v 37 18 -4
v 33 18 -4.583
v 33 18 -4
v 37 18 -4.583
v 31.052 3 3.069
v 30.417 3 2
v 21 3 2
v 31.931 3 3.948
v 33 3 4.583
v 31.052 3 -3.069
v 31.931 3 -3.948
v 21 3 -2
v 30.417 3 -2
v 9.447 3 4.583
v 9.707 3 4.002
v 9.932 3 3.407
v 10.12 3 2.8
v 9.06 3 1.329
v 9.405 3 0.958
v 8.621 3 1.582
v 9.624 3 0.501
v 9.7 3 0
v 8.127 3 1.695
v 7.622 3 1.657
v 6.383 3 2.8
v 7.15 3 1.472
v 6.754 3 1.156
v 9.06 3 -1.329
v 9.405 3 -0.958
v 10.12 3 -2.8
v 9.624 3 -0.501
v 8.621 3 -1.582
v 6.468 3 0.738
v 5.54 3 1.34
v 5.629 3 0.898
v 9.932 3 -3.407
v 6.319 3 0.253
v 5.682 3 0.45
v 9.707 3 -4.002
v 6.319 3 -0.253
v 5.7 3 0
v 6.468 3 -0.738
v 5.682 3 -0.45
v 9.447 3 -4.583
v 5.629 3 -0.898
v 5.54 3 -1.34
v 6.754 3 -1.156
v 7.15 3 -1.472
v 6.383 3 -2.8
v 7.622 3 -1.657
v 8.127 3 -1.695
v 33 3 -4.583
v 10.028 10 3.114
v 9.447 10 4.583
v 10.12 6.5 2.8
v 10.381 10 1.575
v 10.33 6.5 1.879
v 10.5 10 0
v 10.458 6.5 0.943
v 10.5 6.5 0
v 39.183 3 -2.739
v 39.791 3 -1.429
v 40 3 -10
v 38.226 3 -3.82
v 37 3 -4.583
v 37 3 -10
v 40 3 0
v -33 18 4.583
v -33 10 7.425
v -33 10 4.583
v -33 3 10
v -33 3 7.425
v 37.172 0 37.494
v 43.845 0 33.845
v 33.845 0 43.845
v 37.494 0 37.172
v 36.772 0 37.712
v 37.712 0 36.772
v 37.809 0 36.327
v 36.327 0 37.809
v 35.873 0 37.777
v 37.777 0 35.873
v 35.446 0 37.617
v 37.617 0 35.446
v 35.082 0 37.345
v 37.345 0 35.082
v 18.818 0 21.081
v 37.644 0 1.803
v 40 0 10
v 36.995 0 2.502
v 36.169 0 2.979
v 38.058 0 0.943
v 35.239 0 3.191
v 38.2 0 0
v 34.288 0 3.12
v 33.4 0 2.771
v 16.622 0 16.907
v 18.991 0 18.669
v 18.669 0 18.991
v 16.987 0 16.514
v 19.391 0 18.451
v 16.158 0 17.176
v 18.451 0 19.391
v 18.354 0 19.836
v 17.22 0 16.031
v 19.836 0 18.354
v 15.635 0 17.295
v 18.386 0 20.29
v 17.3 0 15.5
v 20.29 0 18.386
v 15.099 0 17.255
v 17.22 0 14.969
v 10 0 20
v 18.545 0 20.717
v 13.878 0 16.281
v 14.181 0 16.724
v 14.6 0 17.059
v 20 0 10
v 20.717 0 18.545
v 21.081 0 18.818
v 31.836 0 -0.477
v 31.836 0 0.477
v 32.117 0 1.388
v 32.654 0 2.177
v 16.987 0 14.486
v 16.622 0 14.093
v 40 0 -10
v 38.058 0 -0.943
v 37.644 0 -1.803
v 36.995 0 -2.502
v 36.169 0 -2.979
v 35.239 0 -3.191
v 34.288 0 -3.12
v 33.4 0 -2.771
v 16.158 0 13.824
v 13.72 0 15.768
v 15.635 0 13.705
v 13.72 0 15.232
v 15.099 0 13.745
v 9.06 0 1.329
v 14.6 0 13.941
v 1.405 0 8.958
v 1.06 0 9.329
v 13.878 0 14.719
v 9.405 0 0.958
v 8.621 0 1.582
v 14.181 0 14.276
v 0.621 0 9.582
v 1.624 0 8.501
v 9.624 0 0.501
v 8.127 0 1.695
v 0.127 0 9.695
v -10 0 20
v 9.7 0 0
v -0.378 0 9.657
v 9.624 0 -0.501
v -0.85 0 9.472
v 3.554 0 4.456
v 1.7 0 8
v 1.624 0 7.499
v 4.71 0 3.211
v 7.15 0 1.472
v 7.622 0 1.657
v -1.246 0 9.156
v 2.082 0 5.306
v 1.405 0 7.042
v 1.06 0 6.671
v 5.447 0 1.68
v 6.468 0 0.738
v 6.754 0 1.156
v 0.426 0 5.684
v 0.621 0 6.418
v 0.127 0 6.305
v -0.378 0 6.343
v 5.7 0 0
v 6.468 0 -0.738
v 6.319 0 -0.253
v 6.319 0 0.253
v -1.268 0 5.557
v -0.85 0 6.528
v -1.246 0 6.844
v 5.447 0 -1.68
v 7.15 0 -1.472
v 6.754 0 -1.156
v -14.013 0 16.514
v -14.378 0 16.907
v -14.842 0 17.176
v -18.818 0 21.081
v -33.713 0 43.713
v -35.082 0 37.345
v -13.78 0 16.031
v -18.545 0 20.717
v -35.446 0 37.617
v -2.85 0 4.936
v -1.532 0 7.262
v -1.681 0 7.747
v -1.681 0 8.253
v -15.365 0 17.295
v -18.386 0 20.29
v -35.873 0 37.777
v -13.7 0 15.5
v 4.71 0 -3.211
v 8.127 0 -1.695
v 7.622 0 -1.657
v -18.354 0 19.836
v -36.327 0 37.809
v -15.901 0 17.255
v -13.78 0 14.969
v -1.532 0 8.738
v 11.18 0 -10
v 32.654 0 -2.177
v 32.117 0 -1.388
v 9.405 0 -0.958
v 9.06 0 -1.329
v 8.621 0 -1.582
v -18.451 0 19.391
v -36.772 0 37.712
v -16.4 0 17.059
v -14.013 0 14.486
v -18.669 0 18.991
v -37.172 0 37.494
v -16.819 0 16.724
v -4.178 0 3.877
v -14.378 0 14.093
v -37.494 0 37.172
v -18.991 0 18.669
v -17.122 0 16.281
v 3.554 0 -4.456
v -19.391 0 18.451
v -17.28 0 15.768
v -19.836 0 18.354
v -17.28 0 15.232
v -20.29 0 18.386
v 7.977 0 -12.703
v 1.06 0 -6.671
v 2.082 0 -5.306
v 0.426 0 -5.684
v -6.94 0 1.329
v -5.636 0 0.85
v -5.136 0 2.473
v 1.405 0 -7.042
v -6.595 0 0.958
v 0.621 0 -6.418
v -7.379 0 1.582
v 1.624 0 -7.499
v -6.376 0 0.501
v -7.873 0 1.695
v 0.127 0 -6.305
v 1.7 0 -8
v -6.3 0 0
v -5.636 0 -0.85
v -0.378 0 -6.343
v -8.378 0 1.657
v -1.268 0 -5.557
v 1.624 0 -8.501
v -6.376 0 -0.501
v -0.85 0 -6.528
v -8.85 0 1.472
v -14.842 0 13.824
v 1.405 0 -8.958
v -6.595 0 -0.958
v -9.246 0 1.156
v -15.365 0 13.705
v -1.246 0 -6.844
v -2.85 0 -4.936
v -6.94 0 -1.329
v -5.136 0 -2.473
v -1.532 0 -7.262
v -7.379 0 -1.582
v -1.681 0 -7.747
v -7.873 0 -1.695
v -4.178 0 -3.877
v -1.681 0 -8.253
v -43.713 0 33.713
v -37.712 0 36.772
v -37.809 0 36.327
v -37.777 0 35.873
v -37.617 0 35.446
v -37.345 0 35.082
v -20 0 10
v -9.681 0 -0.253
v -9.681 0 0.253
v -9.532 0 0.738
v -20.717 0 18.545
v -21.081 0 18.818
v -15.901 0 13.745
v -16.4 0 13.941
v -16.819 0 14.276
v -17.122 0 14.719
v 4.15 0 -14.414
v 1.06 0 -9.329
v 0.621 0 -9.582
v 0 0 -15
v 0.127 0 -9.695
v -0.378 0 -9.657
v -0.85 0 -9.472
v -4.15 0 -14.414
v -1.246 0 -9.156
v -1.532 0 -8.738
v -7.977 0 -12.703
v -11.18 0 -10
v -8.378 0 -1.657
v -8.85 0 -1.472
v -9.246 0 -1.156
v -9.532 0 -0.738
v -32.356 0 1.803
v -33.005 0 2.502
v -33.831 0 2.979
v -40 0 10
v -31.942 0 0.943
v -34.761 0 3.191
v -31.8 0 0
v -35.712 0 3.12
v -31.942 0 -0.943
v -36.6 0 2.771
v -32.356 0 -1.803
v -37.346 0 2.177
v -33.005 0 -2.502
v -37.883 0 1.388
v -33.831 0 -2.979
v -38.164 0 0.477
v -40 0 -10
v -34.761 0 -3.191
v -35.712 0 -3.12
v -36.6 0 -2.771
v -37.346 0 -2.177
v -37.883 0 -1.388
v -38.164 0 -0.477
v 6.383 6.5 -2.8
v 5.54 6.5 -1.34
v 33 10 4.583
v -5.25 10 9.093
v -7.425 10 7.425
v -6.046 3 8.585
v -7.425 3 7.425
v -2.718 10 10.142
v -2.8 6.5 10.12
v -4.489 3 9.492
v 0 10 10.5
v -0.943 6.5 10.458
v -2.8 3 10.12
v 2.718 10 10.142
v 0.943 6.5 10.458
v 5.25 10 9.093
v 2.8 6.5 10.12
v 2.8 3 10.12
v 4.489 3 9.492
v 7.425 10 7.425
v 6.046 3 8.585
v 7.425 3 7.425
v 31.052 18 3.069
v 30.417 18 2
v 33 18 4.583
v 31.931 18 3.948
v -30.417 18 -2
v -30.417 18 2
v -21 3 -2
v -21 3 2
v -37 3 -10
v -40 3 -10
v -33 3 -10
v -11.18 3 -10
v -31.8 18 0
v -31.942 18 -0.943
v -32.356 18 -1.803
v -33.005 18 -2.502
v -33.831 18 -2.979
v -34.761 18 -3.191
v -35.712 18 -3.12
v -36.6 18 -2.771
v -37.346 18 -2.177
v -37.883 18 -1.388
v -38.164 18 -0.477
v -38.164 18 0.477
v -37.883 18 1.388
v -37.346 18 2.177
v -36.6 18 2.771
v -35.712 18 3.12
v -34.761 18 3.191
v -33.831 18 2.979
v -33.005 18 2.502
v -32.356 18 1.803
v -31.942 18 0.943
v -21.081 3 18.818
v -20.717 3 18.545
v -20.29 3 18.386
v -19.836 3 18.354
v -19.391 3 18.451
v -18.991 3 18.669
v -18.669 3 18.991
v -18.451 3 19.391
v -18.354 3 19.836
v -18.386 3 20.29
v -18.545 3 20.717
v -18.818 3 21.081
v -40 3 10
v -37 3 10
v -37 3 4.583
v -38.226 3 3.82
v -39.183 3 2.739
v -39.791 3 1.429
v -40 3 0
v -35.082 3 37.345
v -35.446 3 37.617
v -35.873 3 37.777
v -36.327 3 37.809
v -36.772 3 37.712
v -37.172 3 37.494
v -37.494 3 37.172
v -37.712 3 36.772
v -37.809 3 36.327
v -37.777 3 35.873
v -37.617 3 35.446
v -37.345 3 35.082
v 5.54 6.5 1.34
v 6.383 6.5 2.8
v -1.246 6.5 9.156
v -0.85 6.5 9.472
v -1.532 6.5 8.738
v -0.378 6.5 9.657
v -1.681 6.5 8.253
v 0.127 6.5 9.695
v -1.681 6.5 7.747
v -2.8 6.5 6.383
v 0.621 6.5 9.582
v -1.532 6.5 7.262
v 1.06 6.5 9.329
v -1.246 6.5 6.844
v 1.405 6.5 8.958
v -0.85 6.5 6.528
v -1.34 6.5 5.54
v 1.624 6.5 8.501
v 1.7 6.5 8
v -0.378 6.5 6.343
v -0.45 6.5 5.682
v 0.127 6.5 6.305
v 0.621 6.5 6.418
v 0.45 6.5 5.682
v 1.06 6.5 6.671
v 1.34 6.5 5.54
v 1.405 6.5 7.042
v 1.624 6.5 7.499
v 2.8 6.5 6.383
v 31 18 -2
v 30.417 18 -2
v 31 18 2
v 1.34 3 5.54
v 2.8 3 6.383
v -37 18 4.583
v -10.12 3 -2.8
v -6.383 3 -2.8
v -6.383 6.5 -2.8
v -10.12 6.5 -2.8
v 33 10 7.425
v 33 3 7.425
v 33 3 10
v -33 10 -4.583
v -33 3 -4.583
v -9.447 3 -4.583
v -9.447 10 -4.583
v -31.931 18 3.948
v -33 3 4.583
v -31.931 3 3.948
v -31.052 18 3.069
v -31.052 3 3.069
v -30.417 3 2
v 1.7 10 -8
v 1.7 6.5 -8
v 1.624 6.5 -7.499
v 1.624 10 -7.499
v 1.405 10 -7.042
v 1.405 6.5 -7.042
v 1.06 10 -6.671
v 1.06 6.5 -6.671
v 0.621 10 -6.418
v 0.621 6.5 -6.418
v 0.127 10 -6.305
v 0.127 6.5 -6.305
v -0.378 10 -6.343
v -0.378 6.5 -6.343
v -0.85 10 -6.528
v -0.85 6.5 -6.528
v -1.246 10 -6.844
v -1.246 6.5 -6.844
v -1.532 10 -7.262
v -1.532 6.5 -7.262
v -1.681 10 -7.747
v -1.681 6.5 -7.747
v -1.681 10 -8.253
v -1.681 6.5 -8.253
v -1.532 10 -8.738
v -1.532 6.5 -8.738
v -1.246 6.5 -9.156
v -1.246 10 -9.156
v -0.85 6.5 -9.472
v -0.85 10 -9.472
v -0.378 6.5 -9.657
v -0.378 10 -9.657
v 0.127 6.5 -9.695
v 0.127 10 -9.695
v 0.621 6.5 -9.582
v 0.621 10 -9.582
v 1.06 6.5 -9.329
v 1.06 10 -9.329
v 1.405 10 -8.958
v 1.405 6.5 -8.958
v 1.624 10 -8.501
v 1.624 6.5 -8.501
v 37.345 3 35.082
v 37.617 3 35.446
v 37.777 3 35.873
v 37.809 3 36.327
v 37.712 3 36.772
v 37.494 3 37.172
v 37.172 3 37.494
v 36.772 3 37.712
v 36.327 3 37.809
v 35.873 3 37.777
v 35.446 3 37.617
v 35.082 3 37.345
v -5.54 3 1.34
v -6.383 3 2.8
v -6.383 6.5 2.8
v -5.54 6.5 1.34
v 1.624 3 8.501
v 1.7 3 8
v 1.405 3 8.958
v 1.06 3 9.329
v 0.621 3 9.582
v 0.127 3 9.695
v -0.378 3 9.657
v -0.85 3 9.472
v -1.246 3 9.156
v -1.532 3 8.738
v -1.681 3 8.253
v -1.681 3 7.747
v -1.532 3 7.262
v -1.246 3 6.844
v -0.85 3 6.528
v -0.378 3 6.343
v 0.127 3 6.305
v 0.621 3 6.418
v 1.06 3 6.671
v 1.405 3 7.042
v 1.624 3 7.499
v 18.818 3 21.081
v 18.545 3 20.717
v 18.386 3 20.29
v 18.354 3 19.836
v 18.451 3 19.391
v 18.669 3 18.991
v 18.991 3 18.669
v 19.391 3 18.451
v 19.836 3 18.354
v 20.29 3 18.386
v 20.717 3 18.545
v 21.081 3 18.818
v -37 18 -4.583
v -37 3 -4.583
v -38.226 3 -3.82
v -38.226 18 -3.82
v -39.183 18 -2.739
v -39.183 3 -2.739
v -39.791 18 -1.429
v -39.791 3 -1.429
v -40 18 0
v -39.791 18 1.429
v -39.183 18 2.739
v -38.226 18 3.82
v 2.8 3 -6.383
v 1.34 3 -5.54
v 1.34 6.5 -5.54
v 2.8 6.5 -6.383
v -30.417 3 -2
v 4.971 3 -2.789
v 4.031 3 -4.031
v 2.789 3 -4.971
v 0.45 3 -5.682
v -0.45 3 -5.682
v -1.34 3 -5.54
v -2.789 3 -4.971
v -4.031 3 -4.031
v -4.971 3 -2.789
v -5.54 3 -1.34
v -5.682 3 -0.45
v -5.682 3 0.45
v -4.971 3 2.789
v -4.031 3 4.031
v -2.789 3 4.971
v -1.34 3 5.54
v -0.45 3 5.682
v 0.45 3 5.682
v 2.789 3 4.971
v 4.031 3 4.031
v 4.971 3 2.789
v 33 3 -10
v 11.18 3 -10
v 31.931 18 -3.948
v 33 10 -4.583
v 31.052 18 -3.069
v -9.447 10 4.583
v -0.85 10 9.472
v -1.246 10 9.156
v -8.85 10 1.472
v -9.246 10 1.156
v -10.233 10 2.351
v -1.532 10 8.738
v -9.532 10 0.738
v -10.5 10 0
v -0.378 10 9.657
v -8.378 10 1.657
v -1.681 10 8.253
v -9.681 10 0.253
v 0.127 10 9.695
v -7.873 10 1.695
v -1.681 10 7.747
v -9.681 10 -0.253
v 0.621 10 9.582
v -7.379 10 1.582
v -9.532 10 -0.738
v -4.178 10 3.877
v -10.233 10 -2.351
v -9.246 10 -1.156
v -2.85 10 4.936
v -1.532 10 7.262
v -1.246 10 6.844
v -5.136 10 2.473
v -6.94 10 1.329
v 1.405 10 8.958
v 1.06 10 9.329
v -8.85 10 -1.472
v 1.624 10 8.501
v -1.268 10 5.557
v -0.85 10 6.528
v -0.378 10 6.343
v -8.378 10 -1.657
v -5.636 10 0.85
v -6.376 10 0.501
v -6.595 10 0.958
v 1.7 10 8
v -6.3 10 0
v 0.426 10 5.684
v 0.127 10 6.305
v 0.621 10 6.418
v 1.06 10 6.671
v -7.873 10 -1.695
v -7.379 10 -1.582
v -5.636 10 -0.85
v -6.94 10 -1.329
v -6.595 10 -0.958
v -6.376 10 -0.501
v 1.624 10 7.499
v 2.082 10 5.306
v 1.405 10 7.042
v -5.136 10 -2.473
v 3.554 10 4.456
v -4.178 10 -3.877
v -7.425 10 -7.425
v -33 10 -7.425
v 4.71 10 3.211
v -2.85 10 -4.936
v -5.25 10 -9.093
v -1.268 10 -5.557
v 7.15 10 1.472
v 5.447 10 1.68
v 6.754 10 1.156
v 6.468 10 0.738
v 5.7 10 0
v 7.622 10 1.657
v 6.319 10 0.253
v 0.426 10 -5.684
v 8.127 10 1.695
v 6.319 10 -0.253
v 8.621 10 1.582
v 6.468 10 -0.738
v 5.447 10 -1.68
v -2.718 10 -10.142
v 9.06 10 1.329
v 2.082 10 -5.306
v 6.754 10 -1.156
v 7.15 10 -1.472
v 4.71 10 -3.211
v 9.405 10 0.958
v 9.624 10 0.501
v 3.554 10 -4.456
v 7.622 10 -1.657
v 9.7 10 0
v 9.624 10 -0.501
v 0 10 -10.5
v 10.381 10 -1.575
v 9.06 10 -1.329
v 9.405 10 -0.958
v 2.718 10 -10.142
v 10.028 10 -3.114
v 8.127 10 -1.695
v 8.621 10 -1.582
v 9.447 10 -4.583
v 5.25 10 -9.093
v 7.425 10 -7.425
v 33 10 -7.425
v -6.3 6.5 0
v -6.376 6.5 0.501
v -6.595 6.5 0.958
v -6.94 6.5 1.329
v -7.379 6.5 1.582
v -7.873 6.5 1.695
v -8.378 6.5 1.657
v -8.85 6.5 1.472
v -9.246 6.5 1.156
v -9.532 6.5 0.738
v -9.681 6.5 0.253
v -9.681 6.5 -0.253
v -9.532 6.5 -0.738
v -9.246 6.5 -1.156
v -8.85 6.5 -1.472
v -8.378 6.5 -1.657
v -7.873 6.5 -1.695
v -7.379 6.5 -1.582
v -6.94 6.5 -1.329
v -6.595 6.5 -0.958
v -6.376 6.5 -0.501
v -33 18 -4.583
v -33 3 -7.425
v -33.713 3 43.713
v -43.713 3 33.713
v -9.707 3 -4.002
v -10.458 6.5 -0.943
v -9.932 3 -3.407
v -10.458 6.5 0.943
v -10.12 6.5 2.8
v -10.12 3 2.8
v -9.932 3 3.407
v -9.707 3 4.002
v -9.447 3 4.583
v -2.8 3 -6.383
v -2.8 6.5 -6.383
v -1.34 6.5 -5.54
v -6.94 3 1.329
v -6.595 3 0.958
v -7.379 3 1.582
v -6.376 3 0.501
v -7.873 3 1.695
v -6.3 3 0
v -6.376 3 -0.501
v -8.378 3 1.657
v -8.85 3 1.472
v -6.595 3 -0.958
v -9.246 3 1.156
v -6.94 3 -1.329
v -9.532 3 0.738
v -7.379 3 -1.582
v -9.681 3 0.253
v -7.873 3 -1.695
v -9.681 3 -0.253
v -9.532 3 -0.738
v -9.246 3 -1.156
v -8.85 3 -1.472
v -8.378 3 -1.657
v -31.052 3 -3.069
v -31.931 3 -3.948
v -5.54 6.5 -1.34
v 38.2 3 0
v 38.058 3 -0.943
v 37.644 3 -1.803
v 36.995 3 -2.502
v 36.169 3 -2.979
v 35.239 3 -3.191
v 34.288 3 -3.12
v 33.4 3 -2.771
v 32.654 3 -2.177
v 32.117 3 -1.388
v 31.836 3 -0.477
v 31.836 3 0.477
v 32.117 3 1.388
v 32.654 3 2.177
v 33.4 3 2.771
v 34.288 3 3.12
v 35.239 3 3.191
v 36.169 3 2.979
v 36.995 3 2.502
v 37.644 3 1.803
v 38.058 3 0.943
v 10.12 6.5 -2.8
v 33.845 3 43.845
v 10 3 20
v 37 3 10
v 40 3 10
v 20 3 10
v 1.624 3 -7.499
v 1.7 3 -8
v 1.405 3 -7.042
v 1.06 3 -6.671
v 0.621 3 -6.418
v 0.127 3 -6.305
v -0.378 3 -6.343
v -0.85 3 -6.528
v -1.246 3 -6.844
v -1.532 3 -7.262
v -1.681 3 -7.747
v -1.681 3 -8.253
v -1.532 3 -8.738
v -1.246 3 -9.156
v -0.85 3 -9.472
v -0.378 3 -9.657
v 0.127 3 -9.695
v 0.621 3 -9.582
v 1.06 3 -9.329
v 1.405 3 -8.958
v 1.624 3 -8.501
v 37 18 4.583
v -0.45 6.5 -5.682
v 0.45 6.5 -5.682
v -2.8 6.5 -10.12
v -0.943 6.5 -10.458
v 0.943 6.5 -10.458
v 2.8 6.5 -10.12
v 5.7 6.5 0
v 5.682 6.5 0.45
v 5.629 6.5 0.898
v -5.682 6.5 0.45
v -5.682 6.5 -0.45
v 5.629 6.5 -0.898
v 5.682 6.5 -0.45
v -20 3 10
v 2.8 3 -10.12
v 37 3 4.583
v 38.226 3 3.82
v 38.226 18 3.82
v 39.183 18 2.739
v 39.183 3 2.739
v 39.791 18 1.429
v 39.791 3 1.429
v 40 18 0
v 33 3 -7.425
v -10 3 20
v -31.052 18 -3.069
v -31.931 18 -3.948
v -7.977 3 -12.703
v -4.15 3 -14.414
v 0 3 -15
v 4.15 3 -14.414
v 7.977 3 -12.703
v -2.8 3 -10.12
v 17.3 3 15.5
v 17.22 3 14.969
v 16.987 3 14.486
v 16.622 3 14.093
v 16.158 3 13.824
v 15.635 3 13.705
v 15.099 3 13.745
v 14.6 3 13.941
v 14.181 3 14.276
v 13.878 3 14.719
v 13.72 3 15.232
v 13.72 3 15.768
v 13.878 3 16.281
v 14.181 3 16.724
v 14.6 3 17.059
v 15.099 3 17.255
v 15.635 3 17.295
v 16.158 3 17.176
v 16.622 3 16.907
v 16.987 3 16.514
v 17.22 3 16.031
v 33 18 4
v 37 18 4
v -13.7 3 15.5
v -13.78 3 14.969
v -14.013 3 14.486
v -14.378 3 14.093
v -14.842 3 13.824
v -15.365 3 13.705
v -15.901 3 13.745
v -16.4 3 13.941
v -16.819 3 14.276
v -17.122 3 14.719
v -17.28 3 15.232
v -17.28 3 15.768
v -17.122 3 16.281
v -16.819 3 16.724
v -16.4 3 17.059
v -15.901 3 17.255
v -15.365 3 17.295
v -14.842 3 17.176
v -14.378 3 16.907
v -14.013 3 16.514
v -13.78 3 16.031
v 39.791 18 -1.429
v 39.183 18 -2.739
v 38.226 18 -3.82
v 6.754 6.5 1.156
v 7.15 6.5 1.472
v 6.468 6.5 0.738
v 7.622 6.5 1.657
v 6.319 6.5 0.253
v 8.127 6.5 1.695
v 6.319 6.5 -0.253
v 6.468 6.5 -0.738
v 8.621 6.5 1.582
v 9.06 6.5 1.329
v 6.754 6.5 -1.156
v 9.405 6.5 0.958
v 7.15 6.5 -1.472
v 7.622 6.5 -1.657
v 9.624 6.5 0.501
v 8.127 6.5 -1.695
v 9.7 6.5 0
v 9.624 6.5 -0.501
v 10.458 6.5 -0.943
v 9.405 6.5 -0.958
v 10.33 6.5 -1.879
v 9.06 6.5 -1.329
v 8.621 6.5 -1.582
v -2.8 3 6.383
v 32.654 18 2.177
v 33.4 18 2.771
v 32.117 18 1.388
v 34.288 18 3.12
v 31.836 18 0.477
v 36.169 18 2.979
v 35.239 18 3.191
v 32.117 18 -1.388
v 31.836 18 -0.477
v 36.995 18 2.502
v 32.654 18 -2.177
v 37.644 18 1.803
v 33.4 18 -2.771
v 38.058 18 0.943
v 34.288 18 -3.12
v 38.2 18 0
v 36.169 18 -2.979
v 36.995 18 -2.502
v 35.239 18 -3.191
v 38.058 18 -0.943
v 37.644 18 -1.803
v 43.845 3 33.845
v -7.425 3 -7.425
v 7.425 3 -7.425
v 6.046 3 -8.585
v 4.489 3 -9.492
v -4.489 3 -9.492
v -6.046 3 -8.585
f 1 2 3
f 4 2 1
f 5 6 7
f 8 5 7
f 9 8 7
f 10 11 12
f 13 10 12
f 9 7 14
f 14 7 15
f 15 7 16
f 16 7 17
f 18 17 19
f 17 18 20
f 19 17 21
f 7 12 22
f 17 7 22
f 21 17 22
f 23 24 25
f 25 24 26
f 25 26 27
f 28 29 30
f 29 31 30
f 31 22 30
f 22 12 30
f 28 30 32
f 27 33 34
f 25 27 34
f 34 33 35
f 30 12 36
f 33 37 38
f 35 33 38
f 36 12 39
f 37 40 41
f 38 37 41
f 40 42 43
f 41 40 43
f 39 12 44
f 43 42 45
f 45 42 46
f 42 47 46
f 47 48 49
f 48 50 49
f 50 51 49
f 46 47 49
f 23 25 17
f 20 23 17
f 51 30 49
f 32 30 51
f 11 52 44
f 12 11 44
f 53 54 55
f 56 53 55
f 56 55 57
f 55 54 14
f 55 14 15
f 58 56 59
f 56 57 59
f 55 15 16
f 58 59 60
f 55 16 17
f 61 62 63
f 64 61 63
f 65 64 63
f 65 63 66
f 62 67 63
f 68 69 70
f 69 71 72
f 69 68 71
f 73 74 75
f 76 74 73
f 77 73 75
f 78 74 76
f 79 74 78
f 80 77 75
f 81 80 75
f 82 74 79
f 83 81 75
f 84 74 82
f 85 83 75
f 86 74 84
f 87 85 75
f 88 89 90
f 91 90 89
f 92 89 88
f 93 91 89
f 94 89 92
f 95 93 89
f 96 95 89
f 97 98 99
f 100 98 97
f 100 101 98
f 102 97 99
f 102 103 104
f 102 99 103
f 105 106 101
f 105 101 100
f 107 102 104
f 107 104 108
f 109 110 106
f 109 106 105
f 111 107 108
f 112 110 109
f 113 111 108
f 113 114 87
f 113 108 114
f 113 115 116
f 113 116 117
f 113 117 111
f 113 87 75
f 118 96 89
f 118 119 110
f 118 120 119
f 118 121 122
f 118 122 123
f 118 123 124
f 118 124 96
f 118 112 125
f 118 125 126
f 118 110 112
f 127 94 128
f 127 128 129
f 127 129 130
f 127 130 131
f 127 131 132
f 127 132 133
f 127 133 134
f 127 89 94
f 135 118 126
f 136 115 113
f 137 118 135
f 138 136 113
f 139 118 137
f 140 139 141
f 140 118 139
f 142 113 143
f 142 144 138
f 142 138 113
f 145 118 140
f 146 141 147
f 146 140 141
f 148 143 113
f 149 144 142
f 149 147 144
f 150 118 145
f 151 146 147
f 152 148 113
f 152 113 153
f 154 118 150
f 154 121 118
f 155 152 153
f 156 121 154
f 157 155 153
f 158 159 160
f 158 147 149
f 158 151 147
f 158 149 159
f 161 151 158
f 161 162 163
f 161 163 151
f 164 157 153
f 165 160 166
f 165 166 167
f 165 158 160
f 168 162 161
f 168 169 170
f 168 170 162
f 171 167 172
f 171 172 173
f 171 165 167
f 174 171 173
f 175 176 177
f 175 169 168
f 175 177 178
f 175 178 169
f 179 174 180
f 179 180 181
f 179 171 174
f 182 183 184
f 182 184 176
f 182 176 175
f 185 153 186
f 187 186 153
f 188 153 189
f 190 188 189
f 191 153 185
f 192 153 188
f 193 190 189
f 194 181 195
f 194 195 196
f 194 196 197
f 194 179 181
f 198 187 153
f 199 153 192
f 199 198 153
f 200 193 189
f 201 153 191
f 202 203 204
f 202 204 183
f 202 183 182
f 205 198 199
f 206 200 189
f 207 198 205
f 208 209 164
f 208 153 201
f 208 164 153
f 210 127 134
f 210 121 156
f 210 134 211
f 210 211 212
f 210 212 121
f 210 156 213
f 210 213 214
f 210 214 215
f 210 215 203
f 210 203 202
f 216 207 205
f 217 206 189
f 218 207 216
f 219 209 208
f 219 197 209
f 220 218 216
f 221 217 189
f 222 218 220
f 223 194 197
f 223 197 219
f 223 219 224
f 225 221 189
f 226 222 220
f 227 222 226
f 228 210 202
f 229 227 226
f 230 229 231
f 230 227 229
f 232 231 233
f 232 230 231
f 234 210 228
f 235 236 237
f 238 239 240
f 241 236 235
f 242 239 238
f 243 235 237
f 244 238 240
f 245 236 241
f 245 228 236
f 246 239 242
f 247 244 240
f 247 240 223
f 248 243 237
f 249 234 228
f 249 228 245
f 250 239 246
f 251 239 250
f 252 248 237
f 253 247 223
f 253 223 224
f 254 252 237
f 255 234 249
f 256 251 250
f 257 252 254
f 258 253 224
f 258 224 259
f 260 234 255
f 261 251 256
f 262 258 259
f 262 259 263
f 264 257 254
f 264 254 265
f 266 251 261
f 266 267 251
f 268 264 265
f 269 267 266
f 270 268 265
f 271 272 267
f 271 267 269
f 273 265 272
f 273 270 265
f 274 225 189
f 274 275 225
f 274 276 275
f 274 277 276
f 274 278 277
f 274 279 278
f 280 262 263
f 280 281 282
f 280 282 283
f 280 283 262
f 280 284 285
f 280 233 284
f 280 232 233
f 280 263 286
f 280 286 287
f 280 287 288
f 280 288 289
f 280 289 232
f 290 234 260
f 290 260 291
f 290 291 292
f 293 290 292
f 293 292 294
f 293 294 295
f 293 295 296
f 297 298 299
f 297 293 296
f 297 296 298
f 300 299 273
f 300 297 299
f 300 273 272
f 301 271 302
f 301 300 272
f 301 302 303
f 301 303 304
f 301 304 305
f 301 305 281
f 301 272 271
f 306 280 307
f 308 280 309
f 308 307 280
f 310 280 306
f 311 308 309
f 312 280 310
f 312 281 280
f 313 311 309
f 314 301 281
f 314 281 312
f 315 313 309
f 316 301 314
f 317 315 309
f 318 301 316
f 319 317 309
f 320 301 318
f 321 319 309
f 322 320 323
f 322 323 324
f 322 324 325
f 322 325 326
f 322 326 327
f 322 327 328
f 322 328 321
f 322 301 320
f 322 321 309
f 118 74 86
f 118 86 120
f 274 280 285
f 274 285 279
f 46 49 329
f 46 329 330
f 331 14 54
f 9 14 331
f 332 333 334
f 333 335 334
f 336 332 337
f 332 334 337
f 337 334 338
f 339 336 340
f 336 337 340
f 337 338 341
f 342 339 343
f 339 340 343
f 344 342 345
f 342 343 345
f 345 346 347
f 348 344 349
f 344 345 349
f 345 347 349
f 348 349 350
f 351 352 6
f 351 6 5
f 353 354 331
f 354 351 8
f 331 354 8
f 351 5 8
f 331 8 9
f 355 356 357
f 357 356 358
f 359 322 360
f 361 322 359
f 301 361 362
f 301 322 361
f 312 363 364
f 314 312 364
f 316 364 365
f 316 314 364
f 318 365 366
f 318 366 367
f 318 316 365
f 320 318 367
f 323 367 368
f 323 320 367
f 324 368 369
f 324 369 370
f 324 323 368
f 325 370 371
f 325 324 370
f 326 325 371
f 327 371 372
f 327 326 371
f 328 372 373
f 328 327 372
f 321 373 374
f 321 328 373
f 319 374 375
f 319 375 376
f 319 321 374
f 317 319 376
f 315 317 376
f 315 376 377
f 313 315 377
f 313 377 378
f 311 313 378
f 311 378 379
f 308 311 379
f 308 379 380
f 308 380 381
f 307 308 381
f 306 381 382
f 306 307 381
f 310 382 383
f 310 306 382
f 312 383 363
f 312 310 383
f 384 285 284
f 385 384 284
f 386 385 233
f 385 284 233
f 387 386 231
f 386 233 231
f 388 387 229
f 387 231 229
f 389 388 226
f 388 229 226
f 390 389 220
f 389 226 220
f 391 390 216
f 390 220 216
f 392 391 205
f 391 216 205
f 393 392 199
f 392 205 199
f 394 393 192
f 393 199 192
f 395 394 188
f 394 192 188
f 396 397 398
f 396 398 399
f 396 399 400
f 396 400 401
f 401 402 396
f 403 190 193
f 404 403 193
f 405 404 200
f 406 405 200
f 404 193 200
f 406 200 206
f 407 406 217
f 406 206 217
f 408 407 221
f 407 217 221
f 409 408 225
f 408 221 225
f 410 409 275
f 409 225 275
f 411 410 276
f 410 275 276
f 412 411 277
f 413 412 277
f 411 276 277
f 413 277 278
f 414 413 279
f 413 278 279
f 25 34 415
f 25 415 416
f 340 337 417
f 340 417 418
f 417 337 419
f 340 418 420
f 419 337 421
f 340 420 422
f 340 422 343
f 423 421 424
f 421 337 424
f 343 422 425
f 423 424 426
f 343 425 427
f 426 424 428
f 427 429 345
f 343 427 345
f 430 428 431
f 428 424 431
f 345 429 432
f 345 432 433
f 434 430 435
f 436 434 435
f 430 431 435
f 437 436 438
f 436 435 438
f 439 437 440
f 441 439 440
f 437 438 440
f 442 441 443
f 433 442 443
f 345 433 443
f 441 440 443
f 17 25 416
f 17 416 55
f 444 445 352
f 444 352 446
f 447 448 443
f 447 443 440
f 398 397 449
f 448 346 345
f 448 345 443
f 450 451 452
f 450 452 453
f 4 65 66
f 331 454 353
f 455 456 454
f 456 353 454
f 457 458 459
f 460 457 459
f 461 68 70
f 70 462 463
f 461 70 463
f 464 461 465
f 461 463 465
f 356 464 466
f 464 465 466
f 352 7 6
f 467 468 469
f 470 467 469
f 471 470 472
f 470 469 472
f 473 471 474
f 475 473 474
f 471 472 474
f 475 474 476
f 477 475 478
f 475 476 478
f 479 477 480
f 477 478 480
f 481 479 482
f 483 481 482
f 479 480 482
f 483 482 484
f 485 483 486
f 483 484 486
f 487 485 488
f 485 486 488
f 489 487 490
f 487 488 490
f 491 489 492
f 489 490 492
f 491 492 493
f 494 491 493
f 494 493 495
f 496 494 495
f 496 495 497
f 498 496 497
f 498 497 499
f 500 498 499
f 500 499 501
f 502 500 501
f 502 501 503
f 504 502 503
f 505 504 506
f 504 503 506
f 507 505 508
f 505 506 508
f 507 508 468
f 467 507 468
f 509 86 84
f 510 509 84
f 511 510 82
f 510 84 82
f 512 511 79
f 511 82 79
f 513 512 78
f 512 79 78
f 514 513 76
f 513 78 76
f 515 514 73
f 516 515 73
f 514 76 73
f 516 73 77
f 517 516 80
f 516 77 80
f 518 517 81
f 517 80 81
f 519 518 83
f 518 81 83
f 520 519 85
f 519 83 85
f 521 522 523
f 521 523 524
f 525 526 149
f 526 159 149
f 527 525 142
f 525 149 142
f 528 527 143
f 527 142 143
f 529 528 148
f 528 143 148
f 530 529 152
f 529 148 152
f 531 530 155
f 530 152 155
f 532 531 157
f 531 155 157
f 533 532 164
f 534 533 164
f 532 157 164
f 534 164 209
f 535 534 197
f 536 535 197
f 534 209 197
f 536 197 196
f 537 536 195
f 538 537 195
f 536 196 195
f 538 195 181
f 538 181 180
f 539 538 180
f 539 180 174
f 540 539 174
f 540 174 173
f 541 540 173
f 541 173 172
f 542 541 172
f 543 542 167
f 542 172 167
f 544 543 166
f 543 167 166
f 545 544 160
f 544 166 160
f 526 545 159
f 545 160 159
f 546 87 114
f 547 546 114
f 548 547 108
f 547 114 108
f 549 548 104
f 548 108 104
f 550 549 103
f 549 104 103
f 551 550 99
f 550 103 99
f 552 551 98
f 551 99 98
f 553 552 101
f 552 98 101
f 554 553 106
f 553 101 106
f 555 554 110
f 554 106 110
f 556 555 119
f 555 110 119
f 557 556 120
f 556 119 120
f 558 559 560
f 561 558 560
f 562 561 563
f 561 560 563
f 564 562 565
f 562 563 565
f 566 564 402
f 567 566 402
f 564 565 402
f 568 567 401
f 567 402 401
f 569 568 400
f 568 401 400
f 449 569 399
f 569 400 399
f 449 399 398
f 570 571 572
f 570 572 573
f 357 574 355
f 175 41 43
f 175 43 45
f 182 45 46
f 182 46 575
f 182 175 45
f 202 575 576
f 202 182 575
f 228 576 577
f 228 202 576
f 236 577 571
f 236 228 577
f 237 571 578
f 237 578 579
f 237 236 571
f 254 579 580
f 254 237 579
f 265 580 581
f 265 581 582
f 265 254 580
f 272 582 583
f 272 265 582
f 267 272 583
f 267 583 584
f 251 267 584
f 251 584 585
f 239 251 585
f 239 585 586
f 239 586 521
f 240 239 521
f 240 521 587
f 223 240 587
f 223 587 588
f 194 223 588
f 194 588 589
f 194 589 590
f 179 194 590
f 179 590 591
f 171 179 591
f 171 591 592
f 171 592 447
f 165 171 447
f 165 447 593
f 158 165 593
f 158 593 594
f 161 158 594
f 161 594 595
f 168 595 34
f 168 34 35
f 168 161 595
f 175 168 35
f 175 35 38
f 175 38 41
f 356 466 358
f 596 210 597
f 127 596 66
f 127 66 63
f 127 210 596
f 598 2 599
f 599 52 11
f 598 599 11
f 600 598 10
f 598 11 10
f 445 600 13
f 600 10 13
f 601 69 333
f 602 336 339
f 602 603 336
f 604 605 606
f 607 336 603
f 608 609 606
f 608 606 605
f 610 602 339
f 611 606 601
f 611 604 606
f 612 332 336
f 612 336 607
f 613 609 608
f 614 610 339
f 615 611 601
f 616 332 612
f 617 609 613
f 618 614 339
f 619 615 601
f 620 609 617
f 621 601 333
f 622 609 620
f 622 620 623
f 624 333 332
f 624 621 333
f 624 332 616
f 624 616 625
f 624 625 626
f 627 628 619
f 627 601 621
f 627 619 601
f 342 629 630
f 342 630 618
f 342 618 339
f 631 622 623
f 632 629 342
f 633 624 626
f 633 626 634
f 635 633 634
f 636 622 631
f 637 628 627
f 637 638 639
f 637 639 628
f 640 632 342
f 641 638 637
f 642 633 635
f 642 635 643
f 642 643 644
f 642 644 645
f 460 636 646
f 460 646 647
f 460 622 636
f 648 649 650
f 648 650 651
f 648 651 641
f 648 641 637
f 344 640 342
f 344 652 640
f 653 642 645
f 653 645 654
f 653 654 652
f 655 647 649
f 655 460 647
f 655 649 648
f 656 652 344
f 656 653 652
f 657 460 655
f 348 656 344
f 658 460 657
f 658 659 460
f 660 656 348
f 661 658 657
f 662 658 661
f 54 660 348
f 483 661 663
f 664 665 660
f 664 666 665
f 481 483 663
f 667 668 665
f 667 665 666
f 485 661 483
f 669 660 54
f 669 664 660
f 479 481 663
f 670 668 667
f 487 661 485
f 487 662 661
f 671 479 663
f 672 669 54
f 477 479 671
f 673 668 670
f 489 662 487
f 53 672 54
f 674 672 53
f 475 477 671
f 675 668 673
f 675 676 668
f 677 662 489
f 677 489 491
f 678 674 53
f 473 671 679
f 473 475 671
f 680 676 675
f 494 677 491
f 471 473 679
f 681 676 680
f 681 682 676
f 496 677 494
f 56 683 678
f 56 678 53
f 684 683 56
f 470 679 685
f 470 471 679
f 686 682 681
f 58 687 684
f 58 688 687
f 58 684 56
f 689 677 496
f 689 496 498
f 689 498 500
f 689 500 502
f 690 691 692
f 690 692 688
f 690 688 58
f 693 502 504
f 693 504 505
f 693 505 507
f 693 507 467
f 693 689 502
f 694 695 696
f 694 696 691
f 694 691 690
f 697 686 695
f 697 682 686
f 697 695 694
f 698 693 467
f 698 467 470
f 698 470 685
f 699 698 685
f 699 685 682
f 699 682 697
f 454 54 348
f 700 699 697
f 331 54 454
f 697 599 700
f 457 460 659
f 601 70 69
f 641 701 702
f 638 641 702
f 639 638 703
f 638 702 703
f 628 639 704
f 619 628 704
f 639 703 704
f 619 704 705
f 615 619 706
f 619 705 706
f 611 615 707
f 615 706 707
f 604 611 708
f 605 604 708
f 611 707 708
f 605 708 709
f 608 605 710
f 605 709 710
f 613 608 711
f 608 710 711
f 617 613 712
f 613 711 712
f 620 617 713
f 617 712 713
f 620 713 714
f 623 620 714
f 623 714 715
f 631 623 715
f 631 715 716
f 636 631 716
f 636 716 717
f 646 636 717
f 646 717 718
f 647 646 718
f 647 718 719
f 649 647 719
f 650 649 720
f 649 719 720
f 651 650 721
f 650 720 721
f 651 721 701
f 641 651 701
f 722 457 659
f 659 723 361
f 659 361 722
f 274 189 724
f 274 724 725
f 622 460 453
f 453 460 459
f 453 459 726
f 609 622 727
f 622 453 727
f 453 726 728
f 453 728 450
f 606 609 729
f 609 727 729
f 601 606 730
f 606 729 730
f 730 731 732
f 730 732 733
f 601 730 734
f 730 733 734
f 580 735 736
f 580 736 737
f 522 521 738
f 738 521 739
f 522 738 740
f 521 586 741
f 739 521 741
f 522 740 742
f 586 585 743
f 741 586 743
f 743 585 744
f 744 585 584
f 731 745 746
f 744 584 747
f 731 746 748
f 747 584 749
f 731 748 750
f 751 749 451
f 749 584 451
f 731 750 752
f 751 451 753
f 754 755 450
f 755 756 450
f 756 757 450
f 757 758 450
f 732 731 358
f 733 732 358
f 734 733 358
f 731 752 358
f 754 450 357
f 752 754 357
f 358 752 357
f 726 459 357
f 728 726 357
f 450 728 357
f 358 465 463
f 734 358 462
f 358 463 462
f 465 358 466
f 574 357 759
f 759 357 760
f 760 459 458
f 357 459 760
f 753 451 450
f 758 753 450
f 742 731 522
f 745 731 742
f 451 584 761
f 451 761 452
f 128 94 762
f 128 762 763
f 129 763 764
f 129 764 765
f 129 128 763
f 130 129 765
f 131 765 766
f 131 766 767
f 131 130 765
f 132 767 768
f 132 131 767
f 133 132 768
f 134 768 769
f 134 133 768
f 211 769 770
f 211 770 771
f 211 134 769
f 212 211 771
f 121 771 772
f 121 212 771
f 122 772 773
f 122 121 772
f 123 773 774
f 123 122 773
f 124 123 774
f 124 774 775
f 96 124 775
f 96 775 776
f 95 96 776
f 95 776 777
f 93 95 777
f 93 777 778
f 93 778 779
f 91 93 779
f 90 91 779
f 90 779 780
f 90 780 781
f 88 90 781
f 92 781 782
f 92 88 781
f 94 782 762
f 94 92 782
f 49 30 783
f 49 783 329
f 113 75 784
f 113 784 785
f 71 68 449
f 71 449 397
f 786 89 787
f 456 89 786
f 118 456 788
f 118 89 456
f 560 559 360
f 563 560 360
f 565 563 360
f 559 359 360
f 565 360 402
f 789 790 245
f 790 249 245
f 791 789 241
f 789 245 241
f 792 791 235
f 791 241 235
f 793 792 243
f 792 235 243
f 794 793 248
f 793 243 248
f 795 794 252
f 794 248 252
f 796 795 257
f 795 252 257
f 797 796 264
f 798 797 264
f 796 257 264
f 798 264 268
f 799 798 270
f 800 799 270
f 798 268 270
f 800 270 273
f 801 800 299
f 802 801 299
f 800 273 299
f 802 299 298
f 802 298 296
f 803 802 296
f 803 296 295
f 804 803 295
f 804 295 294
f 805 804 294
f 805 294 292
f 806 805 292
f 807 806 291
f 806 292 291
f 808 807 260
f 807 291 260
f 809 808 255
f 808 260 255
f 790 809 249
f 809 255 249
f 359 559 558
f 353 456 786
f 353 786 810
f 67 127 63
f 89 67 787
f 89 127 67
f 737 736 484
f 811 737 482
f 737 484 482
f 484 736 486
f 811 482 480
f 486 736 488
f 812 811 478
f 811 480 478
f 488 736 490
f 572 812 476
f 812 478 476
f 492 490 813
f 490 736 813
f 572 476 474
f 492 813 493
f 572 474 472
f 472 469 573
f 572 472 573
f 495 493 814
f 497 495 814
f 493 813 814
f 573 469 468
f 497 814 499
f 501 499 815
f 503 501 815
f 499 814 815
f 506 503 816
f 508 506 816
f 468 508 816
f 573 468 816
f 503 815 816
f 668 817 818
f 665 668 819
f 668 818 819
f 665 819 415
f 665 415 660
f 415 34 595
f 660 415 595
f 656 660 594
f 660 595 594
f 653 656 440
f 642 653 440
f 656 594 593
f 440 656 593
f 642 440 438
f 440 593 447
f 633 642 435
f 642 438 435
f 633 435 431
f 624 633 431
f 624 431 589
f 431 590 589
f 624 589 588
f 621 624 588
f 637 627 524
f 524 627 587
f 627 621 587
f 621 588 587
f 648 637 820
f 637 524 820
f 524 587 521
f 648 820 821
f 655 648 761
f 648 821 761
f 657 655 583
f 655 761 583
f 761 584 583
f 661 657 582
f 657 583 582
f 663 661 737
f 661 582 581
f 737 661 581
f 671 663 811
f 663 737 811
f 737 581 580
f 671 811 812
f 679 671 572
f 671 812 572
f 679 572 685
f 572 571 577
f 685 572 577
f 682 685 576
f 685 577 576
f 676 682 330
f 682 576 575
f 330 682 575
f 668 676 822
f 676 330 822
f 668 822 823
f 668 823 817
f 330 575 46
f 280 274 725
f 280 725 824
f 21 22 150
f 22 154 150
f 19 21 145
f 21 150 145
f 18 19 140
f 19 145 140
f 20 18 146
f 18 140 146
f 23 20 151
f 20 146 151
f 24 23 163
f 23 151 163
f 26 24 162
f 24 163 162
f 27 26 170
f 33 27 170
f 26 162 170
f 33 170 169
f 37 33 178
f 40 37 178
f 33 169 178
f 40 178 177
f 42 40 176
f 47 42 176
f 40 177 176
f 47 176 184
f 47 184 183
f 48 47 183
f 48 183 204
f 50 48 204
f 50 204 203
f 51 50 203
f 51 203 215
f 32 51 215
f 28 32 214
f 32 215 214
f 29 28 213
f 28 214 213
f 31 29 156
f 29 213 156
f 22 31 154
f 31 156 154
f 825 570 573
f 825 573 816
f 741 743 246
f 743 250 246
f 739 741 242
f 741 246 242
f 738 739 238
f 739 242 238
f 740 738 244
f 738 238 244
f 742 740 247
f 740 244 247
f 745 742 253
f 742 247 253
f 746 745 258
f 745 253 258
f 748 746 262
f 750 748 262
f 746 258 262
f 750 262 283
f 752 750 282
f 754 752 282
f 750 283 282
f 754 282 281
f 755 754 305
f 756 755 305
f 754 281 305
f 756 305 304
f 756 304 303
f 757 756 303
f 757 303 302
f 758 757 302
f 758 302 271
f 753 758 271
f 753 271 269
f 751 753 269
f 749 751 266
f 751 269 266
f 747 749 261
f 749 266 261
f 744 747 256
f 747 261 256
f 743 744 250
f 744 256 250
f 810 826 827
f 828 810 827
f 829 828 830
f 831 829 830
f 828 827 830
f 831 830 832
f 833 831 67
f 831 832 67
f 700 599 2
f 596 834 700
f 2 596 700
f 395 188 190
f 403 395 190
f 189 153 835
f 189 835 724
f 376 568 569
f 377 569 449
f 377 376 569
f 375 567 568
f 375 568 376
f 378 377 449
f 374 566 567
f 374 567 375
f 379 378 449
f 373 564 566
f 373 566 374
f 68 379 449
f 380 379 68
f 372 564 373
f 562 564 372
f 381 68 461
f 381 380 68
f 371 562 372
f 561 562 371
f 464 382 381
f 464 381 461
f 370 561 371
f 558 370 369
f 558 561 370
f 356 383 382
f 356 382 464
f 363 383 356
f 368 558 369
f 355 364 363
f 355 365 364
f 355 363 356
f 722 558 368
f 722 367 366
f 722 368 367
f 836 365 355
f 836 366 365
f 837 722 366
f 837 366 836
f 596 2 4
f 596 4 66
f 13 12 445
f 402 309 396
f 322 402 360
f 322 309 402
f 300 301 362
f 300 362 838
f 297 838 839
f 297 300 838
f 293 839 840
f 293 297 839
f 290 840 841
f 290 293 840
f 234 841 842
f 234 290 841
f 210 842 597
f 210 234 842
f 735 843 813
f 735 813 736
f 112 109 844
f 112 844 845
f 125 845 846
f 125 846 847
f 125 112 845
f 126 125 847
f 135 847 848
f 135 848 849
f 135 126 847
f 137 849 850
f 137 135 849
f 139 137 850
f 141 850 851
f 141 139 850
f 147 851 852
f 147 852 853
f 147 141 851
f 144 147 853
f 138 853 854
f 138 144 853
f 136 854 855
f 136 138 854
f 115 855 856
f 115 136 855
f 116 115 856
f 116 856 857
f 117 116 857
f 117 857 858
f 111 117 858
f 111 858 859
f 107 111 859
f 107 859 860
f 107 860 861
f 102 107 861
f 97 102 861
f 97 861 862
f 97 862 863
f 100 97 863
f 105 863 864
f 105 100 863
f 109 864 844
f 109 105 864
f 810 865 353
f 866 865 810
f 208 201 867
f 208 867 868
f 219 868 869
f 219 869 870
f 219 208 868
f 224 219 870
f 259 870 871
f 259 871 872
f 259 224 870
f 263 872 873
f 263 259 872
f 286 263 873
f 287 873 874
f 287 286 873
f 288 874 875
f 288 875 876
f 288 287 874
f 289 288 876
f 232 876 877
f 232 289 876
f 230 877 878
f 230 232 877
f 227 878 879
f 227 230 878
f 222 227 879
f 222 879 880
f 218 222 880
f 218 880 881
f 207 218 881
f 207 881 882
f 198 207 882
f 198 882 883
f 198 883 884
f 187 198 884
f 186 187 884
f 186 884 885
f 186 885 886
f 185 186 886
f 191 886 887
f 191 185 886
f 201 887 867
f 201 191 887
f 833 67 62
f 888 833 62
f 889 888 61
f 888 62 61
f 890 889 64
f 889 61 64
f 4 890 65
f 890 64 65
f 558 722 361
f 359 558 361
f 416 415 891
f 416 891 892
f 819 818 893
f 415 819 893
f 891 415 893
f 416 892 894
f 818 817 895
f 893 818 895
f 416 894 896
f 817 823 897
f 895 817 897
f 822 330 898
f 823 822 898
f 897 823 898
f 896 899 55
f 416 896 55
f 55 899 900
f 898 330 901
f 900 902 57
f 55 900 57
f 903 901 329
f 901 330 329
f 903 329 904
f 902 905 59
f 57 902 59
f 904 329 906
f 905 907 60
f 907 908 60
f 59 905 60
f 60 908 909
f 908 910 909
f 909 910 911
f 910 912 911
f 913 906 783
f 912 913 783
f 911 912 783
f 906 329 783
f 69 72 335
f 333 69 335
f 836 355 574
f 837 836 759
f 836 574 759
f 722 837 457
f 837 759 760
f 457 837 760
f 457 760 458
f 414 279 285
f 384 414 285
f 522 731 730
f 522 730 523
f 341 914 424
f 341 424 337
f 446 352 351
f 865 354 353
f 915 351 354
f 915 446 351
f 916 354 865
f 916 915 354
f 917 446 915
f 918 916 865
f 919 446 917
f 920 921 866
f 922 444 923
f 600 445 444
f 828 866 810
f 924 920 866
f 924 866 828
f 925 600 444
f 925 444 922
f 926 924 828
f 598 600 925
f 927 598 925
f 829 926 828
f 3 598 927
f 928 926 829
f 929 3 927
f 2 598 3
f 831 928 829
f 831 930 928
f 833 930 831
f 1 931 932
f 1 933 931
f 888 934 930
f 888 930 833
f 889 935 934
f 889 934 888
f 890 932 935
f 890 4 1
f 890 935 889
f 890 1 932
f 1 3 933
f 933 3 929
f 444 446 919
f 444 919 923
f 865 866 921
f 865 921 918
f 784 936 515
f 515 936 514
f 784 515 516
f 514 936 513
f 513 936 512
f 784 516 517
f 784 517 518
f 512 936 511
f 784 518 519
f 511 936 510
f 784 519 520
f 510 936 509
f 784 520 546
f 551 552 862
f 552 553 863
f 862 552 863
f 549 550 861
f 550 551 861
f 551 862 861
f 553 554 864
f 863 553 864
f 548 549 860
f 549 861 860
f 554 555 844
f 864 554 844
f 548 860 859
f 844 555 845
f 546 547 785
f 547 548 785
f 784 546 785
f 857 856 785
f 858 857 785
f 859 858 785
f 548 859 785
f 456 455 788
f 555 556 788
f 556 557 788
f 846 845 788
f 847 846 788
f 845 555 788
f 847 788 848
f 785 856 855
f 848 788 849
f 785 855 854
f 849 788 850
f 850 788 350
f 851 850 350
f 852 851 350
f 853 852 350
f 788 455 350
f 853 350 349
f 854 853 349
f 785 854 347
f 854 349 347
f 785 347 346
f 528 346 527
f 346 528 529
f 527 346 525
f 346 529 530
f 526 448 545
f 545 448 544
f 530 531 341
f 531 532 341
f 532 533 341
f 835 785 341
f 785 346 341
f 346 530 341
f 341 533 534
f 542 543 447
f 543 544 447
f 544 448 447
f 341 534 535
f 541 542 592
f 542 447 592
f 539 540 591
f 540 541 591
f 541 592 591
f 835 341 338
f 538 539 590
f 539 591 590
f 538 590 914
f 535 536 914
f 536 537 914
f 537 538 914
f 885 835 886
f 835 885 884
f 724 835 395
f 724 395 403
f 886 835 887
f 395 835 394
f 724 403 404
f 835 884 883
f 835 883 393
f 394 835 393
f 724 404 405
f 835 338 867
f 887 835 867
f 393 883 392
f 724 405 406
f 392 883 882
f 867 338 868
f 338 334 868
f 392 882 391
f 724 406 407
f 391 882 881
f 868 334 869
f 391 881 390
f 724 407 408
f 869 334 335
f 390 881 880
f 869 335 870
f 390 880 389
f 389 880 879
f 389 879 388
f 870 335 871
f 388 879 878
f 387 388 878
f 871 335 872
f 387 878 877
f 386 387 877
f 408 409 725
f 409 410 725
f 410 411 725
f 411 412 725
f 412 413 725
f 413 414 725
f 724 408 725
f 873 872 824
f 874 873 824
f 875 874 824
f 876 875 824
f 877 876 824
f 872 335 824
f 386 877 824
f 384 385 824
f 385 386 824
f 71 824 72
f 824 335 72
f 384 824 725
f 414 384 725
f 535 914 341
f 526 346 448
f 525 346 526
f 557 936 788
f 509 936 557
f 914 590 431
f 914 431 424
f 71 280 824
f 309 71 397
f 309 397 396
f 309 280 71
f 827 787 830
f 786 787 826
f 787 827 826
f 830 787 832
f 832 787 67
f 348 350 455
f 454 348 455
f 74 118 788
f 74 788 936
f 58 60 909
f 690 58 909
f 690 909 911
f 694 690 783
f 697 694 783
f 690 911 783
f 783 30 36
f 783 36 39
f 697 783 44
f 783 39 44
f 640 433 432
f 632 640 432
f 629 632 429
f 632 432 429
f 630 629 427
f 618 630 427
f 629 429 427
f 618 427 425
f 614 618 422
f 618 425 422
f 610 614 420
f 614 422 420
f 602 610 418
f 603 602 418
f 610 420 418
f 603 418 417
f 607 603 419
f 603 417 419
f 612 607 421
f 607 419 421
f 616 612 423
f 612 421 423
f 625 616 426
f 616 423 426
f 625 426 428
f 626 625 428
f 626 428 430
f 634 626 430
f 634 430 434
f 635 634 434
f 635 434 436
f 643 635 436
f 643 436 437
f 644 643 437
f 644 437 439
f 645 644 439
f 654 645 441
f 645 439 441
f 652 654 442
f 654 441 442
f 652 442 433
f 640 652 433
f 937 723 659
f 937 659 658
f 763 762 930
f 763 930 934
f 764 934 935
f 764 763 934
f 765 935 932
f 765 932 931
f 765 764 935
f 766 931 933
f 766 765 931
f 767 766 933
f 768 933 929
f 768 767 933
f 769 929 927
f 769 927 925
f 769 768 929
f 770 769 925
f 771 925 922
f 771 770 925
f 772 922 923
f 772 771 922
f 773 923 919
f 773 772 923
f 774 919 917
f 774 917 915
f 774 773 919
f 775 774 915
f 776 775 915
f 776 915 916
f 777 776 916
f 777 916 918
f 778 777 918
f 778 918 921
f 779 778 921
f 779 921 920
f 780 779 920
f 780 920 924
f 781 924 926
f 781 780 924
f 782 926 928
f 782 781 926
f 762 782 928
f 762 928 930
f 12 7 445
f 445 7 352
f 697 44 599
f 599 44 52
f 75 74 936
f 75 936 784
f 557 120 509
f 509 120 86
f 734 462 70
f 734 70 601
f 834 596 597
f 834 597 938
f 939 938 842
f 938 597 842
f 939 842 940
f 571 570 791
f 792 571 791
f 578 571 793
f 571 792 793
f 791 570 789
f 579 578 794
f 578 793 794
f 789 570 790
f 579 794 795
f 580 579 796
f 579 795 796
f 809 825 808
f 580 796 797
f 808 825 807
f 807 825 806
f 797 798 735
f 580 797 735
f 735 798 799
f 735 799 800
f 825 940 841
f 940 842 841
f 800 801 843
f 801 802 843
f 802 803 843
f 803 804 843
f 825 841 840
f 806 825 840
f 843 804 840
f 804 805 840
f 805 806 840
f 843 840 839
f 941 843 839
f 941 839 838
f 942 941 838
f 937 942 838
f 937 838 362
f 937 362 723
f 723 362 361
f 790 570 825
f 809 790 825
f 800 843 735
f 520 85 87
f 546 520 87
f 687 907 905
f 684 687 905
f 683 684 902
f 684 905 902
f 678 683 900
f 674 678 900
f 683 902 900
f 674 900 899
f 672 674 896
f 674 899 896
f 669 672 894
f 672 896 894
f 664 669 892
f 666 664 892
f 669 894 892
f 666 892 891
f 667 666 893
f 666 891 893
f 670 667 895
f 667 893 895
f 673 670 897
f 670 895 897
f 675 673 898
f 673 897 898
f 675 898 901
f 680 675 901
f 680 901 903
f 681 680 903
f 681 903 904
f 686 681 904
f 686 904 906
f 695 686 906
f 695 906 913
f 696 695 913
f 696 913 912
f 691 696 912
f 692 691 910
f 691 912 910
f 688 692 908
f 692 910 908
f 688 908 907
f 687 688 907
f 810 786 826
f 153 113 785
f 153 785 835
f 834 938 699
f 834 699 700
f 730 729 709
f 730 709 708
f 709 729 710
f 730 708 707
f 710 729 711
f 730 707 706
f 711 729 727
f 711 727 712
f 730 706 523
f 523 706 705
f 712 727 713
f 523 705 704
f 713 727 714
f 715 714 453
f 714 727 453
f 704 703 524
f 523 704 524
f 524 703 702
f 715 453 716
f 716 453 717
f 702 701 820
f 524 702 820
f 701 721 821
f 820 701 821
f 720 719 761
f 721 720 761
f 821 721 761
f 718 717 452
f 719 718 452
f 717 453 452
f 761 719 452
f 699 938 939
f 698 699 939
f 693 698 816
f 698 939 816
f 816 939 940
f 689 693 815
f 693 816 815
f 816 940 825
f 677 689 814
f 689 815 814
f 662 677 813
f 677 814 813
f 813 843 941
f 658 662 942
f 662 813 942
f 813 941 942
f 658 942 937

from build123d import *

# Parameters (mm, degrees)
SKETCH_1_R          = 3.2
SKETCH_1_R_2        = 1.8
SKETCH_1_R_3        = 5.7
SKETCH_1_R_4        = 1.7
EXTRUDE_1_DEPTH     = 3
SKETCH_2_R          = 10.5
EXTRUDE_2_DEPTH     = 7
SKETCH_4_R          = 1.7
CUT_EXTRUDE_1_DEPTH = 7
CUT_EXTRUDE_2_DEPTH = 3.5
SKETCH_6_R          = 5.7
CUT_EXTRUDE_3_DEPTH = 20
SKETCH_7_R          = 5
SKETCH_7_R_2        = 3.2
EXTRUDE_3_DEPTH     = 15
SKETCH_8_W          = 10
SKETCH_8_H          = 4
SKETCH_8_W_2        = 4
SKETCH_8_H_2        = 6
EXTRUDE_4_DEPTH     = 15
CUT_EXTRUDE_4_DEPTH = 15
CUT_EXTRUDE_5_DEPTH = 15
CUT_EXTRUDE_6_DEPTH = 15
SKETCH_12_W         = 25.575378798
SKETCH_12_H         = 2.842045507
EXTRUDE_5_DEPTH     = 7


with BuildPart() as part:
    # 草图1 → 凸台-拉伸1 (new body)
    with BuildSketch(Plane(origin=(0, 0, 0), x_dir=(1, 0, 0), z_dir=(0, 1, 0))):
        with BuildLine():
            Line((-35.081832586, -10), (-40, -10))
            Line((-40, -10), (-40, 10))
            Line((-40, 10), (-11.180339887, 10))
            ThreePointArc((-11.180339887, 10), (0, 15), (11.180339887, 10))
            Line((11.180339887, 10), (40, 10))
            Line((40, 10), (40, -10))
            Line((40, -10), (20, -10))
            Line((20, -10), (43.844622395, -33.844622395))
            Line((43.844622395, -33.844622395), (33.844622395, -43.844622395))
            Line((33.844622395, -43.844622395), (10, -20))
            Line((10, -20), (-10, -20))
            Line((-10, -20), (-33.713203436, -43.713203436))
            Line((-33.713203436, -43.713203436), (-43.713203436, -33.713203436))
            Line((-43.713203436, -33.713203436), (-20, -10))
            Line((-20, -10), (-35.081832586, -10))
        make_face()
        with Locations((35, 0)):
            Circle(SKETCH_1_R, mode=Mode.SUBTRACT)
        with Locations((-15.5, -15.5)):
            Circle(SKETCH_1_R_2, mode=Mode.SUBTRACT)
        with Locations((15.5, -15.5)):
            Circle(SKETCH_1_R_2, mode=Mode.SUBTRACT)
        with Locations((-35, 0)):
            Circle(SKETCH_1_R, mode=Mode.SUBTRACT)
        Circle(SKETCH_1_R_3, mode=Mode.SUBTRACT)
        with Locations((-8, 0)):
            Circle(SKETCH_1_R_4, mode=Mode.SUBTRACT)
        with Locations((0, 8)):
            Circle(SKETCH_1_R_4, mode=Mode.SUBTRACT)
        with Locations((8, 0)):
            Circle(SKETCH_1_R_4, mode=Mode.SUBTRACT)
        with Locations((0, -8)):
            Circle(SKETCH_1_R_4, mode=Mode.SUBTRACT)
        with BuildLine():
            Line((-18.818376618, -21.081118318), (-35.081832586, -37.344574285))
            ThreePointArc((-35.081832586, -37.344574285), (-37.344574285, -37.344574285), (-37.344574285, -35.081832586))
            Line((-37.344574285, -35.081832586), (-21.081118318, -18.818376618))
            ThreePointArc((-21.081118318, -18.818376618), (-18.818376618, -18.818376618), (-18.818376618, -21.081118318))
        make_face(mode=Mode.SUBTRACT)
        with BuildLine():
            Line((21.081118316, -18.818376616), (37.344574284, -35.081832584))
            ThreePointArc((37.344574284, -35.081832584), (37.344574284, -37.344574284), (35.081832584, -37.344574284))
            Line((35.081832584, -37.344574284), (18.818376616, -21.081118316))
            ThreePointArc((18.818376616, -21.081118316), (18.818376616, -18.818376616), (21.081118316, -18.818376616))
        make_face(mode=Mode.SUBTRACT)
    extrude(amount=EXTRUDE_1_DEPTH)

    # 草图2 → 凸台-拉伸2 (add)
    with BuildSketch(Plane(origin=(0, 3, 0), x_dir=(1, 0, 0), z_dir=(0, 1, 0))):
        Circle(SKETCH_2_R)
    extrude(amount=EXTRUDE_2_DEPTH)

    # 草图4 → 切除-拉伸1 (cut)
    with BuildSketch(Plane.XZ.offset(-3)):
        with Locations((0, -8)):
            Circle(SKETCH_4_R)
        with Locations((-8, 0)):
            Circle(SKETCH_4_R)
        with Locations((8, 0)):
            Circle(SKETCH_4_R)
        with Locations((0, 8)):
            Circle(SKETCH_4_R)
    extrude(amount=-CUT_EXTRUDE_1_DEPTH, mode=Mode.SUBTRACT)

    # 草图5 → 切除-拉伸2 (cut)
    with BuildSketch(Plane(origin=(0, 3, 0), x_dir=(1, 0, 0), z_dir=(0, 1, 0))):
        Polygon((-4.766838493, 0), (-6.383419246, 2.8), (-11.233161507, 2.8), (-11.233161507, -2.8), (-6.383419246, -2.8), align=None)
        Polygon((4.766838493, 0), (6.383419246, -2.8), (11.233161507, -2.8), (11.233161507, 2.8), (6.383419246, 2.8), align=None)
        Polygon((-2.8, 11.233161507), (-2.8, 6.383419246), (0, 4.766838493), (2.8, 6.383419246), (2.8, 11.233161507), align=None)
        Polygon((0, -4.766838493), (-2.8, -6.383419246), (-2.8, -11.233161507), (2.8, -11.233161507), (2.8, -6.383419246), align=None)
    extrude(amount=CUT_EXTRUDE_2_DEPTH, mode=Mode.SUBTRACT)

    # 草图6 → 切除-拉伸3 (cut)
    with BuildSketch(Plane.XZ.offset(-3)):
        Circle(SKETCH_6_R)
    extrude(amount=-CUT_EXTRUDE_3_DEPTH, mode=Mode.SUBTRACT)

    # 草图7 → 凸台-拉伸3 (add)
    with BuildSketch(Plane(origin=(0, 3, 0), x_dir=(1, 0, 0), z_dir=(0, 1, 0))):
        with Locations((-35, 0)):
            Circle(SKETCH_7_R)
        with Locations((-35, 0)):
            Circle(SKETCH_7_R_2, mode=Mode.SUBTRACT)
        with Locations((35, 0)):
            Circle(SKETCH_7_R)
        with Locations((35, 0)):
            Circle(SKETCH_7_R_2, mode=Mode.SUBTRACT)
    extrude(amount=EXTRUDE_3_DEPTH)

    # 草图8 → 凸台-拉伸4 (add)
    with BuildSketch(Plane(origin=(0, 3, 0), x_dir=(1, 0, 0), z_dir=(0, 1, 0))):
        with Locations((-26, 0)):
            Rectangle(SKETCH_8_W, SKETCH_8_H)
        with Locations((-35, 7)):
            Rectangle(SKETCH_8_W_2, SKETCH_8_H_2)
        with Locations((-35, -7)):
            Rectangle(SKETCH_8_W_2, SKETCH_8_H_2)
        with Locations((26, 0)):
            Rectangle(SKETCH_8_W, SKETCH_8_H)
        with Locations((35, 7)):
            Rectangle(SKETCH_8_W_2, SKETCH_8_H_2)
        with Locations((35, -7)):
            Rectangle(SKETCH_8_W_2, SKETCH_8_H_2)
    extrude(amount=EXTRUDE_4_DEPTH)

    # 草图9 → 切除-拉伸4 (cut)
    with BuildSketch(Plane.XY.offset(2)):
        Polygon((-30.417424305, 18), (-21, 3), (-21, 18), align=None)
        Polygon((21, 3), (30.417424305, 18), (21, 18), align=None)
    extrude(amount=-CUT_EXTRUDE_4_DEPTH, mode=Mode.SUBTRACT)

    # 草图10 → 切除-拉伸5 (cut)
    with BuildSketch(Plane.ZY.offset(-33)):
        Polygon((-4.582575695, 18), (-10, 3), (-10, 18), align=None)
        Polygon((4.582575695, 18), (10, 18), (10, 3), align=None)
    extrude(amount=-CUT_EXTRUDE_5_DEPTH, mode=Mode.SUBTRACT)

    # 草图11 → 切除-拉伸6 (cut)
    with BuildSketch(Plane(origin=(-33, 0, 0), x_dir=(0, 0, -1), z_dir=(1, 0, 0))):
        Polygon((-4.582575695, 18), (-10, 3), (-10, 18), align=None)
        Polygon((4.582575695, 18), (10, 3), (10, 18), align=None)
    extrude(amount=-CUT_EXTRUDE_6_DEPTH, mode=Mode.SUBTRACT)

    # 草图12 → 凸台-拉伸5 (add)
    with BuildSketch(Plane(origin=(0, 3, 0), x_dir=(1, 0, 0), z_dir=(0, 1, 0))):
        with Locations((-20.212310601, -6.003598449)):
            Rectangle(SKETCH_12_W, SKETCH_12_H)
        with Locations((-20.212310601, 6.003598449)):
            Rectangle(SKETCH_12_W, SKETCH_12_H)
        with Locations((20.212310601, 6.003598449)):
            Rectangle(SKETCH_12_W, SKETCH_12_H)
        with Locations((20.212310601, -6.003598449)):
            Rectangle(SKETCH_12_W, SKETCH_12_H)
    extrude(amount=EXTRUDE_5_DEPTH)


solid = part.part
